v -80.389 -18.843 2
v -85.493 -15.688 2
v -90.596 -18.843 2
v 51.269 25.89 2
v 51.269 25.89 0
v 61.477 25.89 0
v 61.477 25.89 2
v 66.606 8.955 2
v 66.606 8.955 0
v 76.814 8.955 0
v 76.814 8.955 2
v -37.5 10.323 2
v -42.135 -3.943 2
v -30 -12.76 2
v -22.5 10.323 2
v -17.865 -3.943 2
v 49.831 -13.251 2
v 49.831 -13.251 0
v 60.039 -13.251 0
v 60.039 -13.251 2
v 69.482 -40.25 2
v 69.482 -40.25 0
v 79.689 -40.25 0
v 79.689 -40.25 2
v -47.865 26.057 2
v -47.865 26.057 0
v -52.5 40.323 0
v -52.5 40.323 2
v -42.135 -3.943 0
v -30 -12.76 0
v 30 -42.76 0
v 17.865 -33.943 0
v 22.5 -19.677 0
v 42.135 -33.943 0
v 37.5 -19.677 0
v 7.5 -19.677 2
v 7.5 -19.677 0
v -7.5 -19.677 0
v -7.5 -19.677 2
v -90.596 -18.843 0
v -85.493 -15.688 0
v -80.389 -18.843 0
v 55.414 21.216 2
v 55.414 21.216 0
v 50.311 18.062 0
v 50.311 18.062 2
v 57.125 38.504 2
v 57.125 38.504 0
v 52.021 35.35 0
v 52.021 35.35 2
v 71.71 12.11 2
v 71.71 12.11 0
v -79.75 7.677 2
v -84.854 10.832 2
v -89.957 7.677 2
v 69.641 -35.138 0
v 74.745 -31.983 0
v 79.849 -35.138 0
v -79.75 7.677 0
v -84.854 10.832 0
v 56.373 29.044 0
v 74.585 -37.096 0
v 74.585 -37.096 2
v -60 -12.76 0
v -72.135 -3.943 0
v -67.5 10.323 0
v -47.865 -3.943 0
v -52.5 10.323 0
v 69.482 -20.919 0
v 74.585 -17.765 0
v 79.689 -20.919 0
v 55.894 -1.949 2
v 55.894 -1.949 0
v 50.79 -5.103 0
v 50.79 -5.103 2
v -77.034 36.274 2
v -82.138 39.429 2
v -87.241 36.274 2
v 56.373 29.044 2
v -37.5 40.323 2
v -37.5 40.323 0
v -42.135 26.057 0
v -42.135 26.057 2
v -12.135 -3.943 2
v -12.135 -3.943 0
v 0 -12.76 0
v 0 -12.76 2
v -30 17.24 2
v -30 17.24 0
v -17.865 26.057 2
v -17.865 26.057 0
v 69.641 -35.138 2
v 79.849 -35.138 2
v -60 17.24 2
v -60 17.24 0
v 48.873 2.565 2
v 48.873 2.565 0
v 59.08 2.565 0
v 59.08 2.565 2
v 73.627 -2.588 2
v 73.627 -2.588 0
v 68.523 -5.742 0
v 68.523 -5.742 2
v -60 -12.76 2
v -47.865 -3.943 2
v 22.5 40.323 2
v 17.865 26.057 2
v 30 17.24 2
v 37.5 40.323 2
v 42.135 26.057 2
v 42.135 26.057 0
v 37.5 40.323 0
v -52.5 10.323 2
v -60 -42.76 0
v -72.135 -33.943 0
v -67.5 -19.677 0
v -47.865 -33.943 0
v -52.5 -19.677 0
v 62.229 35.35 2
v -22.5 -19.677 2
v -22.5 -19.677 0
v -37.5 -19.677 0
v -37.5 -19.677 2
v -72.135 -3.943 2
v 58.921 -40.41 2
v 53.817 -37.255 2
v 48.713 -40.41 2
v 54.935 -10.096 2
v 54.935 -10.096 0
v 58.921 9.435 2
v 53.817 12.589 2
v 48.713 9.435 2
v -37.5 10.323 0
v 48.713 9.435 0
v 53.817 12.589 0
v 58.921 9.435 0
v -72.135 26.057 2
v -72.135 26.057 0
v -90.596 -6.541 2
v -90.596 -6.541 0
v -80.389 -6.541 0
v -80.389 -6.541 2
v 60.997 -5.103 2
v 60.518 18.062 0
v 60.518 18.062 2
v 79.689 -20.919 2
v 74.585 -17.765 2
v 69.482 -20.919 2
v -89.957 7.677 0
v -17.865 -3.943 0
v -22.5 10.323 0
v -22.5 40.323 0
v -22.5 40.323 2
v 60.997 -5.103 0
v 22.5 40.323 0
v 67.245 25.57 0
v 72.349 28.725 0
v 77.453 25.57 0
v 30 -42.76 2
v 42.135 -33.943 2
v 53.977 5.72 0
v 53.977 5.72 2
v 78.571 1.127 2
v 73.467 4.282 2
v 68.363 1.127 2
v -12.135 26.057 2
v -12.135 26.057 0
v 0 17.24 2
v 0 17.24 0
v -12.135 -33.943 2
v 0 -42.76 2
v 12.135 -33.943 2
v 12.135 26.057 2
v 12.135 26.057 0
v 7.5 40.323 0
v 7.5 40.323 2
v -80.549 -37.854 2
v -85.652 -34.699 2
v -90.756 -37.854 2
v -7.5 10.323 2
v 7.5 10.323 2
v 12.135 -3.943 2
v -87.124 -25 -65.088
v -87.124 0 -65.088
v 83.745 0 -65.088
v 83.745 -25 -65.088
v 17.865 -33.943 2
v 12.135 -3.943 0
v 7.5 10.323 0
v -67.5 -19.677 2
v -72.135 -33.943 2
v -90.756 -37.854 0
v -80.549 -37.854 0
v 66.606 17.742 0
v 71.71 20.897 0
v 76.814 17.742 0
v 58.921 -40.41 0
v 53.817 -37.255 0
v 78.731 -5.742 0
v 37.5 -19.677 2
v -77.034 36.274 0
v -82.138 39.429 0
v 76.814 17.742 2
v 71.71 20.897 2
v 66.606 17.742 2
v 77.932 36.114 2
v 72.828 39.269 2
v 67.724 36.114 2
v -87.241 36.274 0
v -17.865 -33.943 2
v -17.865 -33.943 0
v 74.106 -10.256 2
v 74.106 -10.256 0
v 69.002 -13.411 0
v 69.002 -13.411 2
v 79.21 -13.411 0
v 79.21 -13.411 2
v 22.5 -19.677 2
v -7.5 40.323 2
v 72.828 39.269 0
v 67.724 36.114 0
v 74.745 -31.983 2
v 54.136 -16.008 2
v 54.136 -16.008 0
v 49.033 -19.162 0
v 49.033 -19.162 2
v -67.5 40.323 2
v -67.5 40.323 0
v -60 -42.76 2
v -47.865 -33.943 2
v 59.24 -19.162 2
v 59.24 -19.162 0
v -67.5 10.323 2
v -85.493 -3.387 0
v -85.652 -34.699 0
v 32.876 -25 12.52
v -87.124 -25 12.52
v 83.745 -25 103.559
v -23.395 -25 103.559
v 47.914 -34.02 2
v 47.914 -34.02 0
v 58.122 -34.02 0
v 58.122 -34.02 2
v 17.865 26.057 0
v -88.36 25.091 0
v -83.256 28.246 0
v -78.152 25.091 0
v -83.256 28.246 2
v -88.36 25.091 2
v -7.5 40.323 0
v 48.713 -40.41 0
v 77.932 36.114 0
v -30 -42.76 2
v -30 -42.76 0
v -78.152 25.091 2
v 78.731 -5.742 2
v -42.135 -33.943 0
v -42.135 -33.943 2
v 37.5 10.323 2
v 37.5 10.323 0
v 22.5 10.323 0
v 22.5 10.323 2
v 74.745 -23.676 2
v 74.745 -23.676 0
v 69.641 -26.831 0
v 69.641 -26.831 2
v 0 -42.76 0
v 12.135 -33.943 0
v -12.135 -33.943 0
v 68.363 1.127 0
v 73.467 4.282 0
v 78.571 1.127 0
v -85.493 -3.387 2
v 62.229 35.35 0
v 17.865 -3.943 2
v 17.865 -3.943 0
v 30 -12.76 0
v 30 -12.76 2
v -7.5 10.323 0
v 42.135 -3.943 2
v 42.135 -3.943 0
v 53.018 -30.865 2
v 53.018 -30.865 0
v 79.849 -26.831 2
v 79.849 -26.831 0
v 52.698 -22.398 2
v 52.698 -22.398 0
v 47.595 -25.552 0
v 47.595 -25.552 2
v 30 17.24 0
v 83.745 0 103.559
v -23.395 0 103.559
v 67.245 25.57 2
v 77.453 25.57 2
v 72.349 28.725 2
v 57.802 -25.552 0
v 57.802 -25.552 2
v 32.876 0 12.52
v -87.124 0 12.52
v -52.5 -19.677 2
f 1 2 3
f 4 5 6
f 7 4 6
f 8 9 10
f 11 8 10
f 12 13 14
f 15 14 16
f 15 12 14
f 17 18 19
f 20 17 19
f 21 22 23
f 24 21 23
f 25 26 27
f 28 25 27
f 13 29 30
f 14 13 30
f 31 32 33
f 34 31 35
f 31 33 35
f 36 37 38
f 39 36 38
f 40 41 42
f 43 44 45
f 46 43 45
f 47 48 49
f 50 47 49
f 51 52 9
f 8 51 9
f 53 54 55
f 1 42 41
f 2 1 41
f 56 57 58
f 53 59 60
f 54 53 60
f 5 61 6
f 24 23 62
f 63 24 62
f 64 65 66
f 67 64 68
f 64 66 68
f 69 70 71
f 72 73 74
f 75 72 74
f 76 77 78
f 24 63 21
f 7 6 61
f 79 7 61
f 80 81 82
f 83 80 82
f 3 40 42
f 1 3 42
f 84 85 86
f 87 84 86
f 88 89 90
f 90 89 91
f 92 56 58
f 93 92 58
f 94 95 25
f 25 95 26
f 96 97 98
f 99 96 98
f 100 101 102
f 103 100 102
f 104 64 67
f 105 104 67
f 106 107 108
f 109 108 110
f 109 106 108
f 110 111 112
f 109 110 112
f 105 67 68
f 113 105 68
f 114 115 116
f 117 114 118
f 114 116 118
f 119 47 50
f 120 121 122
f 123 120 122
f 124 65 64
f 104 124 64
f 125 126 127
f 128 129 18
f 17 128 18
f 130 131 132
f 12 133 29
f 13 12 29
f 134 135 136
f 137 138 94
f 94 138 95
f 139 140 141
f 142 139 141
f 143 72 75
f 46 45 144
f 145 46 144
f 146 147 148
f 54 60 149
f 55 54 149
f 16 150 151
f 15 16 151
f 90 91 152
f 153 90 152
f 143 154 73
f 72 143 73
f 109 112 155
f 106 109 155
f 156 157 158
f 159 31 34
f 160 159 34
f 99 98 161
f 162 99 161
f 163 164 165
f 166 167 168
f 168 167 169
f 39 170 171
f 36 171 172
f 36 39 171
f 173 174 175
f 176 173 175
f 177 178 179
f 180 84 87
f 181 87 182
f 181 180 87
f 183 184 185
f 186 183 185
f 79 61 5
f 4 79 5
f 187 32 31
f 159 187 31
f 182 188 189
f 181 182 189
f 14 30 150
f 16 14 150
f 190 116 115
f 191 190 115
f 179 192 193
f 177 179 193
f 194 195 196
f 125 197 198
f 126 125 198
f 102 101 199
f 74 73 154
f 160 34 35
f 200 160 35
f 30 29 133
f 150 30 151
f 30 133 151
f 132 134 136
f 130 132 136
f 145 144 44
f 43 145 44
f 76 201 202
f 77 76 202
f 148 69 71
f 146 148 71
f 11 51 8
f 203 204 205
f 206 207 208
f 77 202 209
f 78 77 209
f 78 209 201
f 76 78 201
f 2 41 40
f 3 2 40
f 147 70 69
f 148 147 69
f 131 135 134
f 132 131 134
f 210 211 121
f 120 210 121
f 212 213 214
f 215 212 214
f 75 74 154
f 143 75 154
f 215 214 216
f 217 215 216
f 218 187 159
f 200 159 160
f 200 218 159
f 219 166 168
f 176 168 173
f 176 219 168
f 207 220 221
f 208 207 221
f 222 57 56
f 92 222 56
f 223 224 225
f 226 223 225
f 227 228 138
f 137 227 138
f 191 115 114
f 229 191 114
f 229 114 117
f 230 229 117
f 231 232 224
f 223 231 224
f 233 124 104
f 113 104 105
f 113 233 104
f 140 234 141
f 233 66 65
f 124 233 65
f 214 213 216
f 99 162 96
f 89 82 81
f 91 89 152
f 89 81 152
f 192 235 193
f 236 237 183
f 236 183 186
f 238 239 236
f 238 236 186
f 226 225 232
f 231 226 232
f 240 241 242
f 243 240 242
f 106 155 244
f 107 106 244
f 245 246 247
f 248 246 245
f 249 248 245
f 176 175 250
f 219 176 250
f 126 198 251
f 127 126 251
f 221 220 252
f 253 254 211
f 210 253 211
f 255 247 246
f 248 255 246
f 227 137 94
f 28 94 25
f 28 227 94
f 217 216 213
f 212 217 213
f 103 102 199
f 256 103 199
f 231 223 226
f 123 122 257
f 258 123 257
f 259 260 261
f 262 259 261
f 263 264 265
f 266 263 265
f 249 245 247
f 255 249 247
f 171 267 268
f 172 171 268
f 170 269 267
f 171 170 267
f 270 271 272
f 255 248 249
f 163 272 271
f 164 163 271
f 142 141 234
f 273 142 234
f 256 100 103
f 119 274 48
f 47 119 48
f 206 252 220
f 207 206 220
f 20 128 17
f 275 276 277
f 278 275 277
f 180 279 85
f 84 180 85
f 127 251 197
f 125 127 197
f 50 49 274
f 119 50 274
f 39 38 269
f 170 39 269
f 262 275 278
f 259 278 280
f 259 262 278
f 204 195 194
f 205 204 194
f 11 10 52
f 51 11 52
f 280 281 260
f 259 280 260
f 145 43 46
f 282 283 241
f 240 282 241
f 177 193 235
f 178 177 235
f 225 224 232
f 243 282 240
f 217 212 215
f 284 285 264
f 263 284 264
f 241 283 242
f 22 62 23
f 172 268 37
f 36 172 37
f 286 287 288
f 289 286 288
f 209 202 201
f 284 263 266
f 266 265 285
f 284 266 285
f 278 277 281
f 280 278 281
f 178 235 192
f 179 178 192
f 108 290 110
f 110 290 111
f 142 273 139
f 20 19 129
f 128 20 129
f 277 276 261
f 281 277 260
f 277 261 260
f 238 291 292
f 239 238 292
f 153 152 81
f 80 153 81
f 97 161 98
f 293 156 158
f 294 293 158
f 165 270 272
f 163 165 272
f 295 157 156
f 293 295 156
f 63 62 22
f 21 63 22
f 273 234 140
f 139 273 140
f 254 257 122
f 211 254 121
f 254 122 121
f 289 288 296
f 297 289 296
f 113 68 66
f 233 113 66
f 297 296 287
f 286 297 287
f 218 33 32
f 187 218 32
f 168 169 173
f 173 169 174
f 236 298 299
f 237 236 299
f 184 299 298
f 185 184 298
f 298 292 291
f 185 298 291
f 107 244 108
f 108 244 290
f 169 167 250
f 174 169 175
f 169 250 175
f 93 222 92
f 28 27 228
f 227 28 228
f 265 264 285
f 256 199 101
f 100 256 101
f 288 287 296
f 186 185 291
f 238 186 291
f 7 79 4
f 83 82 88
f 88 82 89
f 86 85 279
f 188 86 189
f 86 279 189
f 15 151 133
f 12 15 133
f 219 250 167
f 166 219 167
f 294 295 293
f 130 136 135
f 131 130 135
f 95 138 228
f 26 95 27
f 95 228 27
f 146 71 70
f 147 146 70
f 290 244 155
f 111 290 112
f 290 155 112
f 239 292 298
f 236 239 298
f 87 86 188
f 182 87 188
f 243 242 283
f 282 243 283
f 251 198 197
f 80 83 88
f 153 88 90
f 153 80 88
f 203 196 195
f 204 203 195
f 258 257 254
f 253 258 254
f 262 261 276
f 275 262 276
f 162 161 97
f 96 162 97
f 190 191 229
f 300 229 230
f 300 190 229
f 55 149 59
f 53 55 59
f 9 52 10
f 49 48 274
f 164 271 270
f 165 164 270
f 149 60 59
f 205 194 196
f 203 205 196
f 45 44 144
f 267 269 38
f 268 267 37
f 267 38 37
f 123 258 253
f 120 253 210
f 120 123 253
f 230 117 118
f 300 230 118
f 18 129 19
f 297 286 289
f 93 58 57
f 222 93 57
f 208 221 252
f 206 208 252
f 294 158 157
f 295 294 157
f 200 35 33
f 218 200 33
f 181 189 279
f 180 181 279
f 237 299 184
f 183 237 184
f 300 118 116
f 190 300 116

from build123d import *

# Parameters (mm, degrees)
F1_DEPTH = 2
F3_DEPTH = 25


with BuildPart() as f1:
    # F0 (on Top) → F1 (new body)
    with BuildSketch(Plane.XY):
        Polygon((-82.137629, 39.428669), (-87.241395, 36.274057), (-77.033864, 36.274057), align=None)
        Polygon((-52.5, 40.322864), (-67.5, 40.322864), (-72.135255, 26.057017), (-60, 17.240238), (-47.864745, 26.057017), align=None)
        Polygon((-22.5, 40.322864), (-37.5, 40.322864), (-42.135255, 26.057017), (-30, 17.240238), (-17.864745, 26.057017), align=None)
        Polygon((7.5, 40.322864), (-7.5, 40.322864), (-12.135255, 26.057017), (0, 17.240238), (12.135255, 26.057017), align=None)
        Polygon((37.5, 40.322864), (22.5, 40.322864), (17.864745, 26.057017), (30, 17.240238), (42.135255, 26.057017), align=None)
        Polygon((37.5, 10.322864), (22.5, 10.322864), (17.864745, -3.942983), (30, -12.759762), (42.135255, -3.942983), align=None)
        Polygon((7.5, 10.322864), (-7.5, 10.322864), (-12.135255, -3.942983), (0, -12.759762), (12.135255, -3.942983), align=None)
        Polygon((-22.5, 10.322864), (-37.5, 10.322864), (-42.135255, -3.942983), (-30, -12.759762), (-17.864745, -3.942983), align=None)
        Polygon((-52.5, 10.322864), (-67.5, 10.322864), (-72.135255, -3.942983), (-60, -12.759762), (-47.864745, -3.942983), align=None)
        Polygon((-52.5, -19.677136), (-67.5, -19.677136), (-72.135255, -33.942983), (-60, -42.759762), (-47.864745, -33.942983), align=None)
        Polygon((-22.5, -19.677136), (-37.5, -19.677136), (-42.135255, -33.942983), (-30, -42.759762), (-17.864745, -33.942983), align=None)
        Polygon((7.5, -19.677136), (-7.5, -19.677136), (-12.135255, -33.942983), (0, -42.759762), (12.135255, -33.942983), align=None)
        Polygon((37.5, -19.677136), (22.5, -19.677136), (17.864745, -33.942983), (30, -42.759762), (42.135255, -33.942983), align=None)
        Polygon((-83.255939, 28.245577), (-88.359705, 25.090965), (-78.152173, 25.090965), align=None)
        Polygon((-84.853522, 10.831906), (-89.957288, 7.677294), (-79.749757, 7.677294), align=None)
        Polygon((-85.492559, -3.386596), (-90.596325, -6.541207), (-80.388793, -6.541207), align=None)
        Polygon((-85.492559, -15.687996), (-90.596325, -18.842607), (-80.388793, -18.842607), align=None)
        Polygon((-85.652322, -34.699251), (-90.756087, -37.853863), (-80.548556, -37.853863), align=None)
        Polygon((74.585393, -37.095622), (69.481627, -40.250234), (79.689159, -40.250234), align=None)
        Polygon((53.816795, -37.255378), (48.71303, -40.409989), (58.920561, -40.409989), align=None)
        Polygon((53.018, -30.865041), (47.914234, -34.019652), (58.121766, -34.019652), align=None)
        Polygon((74.745148, -31.98335), (69.641383, -35.137962), (79.848914, -35.137962), align=None)
        Polygon((74.745148, -23.675912), (69.641383, -26.830524), (79.848914, -26.830524), align=None)
        Polygon((52.698486, -22.397845), (47.59472, -25.552457), (57.802251, -25.552457), align=None)
        Polygon((54.136313, -16.007506), (49.032548, -19.162118), (59.240079, -19.162118), align=None)
        Polygon((74.585393, -17.764851), (69.481627, -20.919462), (79.689159, -20.919462), align=None)
        Polygon((54.935101, -10.096444), (49.831336, -13.251055), (60.038867, -13.251055), align=None)
        Polygon((74.10612, -10.256203), (69.002354, -13.410815), (79.209885, -13.410815), align=None)
        Polygon((73.626839, -2.587798), (68.523073, -5.742409), (78.730604, -5.742409), align=None)
        Polygon((55.893652, -1.948764), (50.789886, -5.103376), (60.997418, -5.103376), align=None)
        Polygon((53.976554, 5.719641), (48.872789, 2.56503), (59.08032, 2.56503), align=None)
        Polygon((73.467083, 4.281815), (68.363317, 1.127203), (78.570849, 1.127203), align=None)
        Polygon((71.709745, 12.109978), (66.605979, 8.955366), (76.81351, 8.955366), align=None)
        Polygon((53.816795, 12.589253), (48.71303, 9.434642), (58.920561, 9.434642), align=None)
        Polygon((55.414379, 21.216211), (50.310613, 18.061599), (60.518144, 18.061599), align=None)
        Polygon((71.709745, 20.896693), (66.605979, 17.742081), (76.81351, 17.742081), align=None)
        Polygon((72.348773, 28.724856), (67.245008, 25.570244), (77.452539, 25.570244), align=None)
        Polygon((56.372929, 29.044372), (51.269164, 25.88976), (61.476695, 25.88976), align=None)
        Polygon((72.828047, 39.268914), (67.724281, 36.114302), (77.931813, 36.114302), align=None)
        Polygon((57.124982, 38.504421), (52.021216, 35.349809), (62.228748, 35.349809), align=None)
    extrude(amount=F1_DEPTH)


with BuildPart() as f3:
    # F2 (on Front) → F3 (new body)
    with BuildSketch(Plane.XZ):
        Polygon((32.875783, 12.520379), (-87.124217, 12.520379), (-87.124217, -65.088317), (83.745341, -65.088317), (83.745341, 103.55888), (-23.394651, 103.55888), align=None)
    extrude(amount=F3_DEPTH)


solid = Compound([f1.part, f3.part])
